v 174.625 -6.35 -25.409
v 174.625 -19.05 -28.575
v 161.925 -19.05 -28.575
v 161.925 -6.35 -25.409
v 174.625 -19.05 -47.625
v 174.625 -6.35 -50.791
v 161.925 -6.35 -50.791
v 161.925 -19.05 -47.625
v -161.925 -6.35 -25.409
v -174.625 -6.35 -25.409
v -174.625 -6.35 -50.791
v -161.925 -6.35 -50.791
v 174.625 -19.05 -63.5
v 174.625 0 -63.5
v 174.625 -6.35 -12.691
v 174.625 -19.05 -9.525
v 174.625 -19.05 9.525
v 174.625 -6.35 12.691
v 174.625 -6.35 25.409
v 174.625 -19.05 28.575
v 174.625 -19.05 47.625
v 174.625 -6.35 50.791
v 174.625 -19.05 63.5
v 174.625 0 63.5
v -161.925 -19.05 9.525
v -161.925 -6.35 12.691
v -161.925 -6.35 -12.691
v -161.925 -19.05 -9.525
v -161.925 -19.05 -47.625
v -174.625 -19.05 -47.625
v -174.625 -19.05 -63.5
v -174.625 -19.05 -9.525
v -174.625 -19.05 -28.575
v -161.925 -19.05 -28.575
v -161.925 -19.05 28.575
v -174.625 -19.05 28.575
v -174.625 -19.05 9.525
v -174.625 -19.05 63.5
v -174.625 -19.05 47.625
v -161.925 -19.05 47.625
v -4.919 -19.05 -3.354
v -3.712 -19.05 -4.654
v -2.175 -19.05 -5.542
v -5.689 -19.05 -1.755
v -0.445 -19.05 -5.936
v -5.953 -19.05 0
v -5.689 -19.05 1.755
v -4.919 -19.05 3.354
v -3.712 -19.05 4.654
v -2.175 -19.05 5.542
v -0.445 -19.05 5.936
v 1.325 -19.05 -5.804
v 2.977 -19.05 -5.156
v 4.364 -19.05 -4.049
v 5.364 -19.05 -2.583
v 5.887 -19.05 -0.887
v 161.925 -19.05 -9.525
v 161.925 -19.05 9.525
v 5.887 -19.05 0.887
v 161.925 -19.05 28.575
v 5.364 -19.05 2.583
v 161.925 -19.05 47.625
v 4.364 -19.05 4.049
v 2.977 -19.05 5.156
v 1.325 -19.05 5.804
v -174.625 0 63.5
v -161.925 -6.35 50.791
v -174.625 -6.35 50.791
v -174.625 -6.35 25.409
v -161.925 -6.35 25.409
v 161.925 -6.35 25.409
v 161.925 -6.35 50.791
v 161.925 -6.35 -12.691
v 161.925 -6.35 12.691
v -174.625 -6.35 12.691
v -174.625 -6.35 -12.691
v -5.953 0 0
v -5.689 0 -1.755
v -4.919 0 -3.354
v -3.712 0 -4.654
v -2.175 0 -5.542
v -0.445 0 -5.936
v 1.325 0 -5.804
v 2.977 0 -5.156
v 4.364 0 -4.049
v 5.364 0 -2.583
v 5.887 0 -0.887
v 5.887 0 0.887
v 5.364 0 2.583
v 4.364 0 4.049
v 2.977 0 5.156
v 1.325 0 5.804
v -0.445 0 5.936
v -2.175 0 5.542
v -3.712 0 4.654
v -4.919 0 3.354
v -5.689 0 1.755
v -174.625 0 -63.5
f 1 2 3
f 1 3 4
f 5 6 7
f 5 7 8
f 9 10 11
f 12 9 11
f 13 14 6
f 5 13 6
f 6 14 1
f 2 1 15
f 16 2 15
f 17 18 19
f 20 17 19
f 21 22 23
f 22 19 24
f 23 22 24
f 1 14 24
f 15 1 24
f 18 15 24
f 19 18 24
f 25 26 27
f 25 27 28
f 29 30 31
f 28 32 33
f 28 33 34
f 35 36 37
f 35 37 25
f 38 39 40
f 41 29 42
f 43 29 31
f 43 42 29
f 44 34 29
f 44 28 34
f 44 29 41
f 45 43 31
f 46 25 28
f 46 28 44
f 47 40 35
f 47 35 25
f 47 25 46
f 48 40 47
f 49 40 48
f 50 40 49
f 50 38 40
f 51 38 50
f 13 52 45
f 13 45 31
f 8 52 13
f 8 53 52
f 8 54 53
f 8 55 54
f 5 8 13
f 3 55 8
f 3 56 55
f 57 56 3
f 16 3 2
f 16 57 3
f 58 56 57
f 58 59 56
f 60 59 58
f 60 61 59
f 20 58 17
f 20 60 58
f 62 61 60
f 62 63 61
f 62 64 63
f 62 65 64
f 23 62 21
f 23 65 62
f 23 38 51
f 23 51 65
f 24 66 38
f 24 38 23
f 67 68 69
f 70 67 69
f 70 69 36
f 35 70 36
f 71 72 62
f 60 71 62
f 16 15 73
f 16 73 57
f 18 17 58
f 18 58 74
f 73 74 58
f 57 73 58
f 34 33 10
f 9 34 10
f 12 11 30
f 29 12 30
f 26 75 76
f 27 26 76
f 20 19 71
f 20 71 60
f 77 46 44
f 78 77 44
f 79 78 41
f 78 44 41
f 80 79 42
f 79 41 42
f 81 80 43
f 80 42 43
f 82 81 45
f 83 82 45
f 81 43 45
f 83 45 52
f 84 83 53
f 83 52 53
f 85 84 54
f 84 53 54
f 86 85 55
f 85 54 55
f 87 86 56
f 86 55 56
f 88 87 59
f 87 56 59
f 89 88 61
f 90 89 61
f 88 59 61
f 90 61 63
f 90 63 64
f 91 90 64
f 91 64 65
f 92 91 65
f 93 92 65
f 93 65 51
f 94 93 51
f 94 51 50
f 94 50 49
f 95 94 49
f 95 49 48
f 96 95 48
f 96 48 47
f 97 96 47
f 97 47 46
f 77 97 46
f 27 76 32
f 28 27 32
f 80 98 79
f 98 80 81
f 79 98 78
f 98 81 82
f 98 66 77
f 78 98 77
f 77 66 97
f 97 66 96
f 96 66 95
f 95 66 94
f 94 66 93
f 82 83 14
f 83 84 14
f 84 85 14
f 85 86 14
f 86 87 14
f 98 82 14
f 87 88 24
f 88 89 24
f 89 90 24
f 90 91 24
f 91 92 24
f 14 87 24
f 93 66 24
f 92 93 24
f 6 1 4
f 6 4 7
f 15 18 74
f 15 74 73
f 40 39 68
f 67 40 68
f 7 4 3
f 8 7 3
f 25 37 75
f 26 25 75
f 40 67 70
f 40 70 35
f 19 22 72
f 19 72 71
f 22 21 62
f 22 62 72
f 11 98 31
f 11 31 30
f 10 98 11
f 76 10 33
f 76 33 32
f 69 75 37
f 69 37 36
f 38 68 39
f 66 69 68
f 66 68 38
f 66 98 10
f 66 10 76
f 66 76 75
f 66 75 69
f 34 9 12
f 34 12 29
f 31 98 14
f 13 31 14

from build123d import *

# Parameters (mm, degrees)
F0_W     = 349.25
F0_H     = 127
F1_DEPTH = 19.05
F3_DEPTH = 12.7
F4_D     = 11.90625
F4_DEPTH = 34.925
F4_TIP   = 3.5769983726


# Not quite as in the source:
# - a pattern or mirror of a feature is missing from the dataset's text; its kind, count and spacing are read off the source's solid


with BuildPart() as f1:
    # F0 (on Front) → F1 (new body)
    with BuildSketch(Plane.XZ):
        Rectangle(F0_W, F0_H)
    extrude(amount=F1_DEPTH)

    # F2 (on face) → F3 (cut)
    with BuildSketch(Plane(origin=(-174.625, 0, 0), x_dir=(0, -1, 0), z_dir=(-1, 0, 0))):
        Polygon((19.05, -47.625), (19.05, -28.575), (6.35, -25.4085343639), (6.35, -50.7914656361), align=None)
        Polygon((19.05, -9.525), (19.05, 9.525), (6.35, 12.6914656361), (6.35, -12.6914656361), align=None)
        Polygon((19.05, 28.575), (19.05, 47.625), (6.35, 50.7914656361), (6.35, 25.4085343639), align=None)
    f3 = extrude(amount=-F3_DEPTH, mode=Mode.SUBTRACT)

    # F3_copies: F3 across plane
    add(f3.mirror(Plane(origin=(0, 0, 0), x_dir=(0, 0, 1), z_dir=(1, 0, 0))), mode=Mode.SUBTRACT)

    # F4
    with Locations(Plane(origin=(0, 0, 0), x_dir=(1, 0, 0), z_dir=(0, 1, 0))):
        with Locations((0, 0)):
            Hole(F4_D / 2, depth=F4_DEPTH)
            with Locations((0, 0, -(F4_DEPTH + F4_TIP / 2))):  # 118° drill point
                Cone(0, F4_D / 2, F4_TIP, mode=Mode.SUBTRACT)


solid = f1.part
